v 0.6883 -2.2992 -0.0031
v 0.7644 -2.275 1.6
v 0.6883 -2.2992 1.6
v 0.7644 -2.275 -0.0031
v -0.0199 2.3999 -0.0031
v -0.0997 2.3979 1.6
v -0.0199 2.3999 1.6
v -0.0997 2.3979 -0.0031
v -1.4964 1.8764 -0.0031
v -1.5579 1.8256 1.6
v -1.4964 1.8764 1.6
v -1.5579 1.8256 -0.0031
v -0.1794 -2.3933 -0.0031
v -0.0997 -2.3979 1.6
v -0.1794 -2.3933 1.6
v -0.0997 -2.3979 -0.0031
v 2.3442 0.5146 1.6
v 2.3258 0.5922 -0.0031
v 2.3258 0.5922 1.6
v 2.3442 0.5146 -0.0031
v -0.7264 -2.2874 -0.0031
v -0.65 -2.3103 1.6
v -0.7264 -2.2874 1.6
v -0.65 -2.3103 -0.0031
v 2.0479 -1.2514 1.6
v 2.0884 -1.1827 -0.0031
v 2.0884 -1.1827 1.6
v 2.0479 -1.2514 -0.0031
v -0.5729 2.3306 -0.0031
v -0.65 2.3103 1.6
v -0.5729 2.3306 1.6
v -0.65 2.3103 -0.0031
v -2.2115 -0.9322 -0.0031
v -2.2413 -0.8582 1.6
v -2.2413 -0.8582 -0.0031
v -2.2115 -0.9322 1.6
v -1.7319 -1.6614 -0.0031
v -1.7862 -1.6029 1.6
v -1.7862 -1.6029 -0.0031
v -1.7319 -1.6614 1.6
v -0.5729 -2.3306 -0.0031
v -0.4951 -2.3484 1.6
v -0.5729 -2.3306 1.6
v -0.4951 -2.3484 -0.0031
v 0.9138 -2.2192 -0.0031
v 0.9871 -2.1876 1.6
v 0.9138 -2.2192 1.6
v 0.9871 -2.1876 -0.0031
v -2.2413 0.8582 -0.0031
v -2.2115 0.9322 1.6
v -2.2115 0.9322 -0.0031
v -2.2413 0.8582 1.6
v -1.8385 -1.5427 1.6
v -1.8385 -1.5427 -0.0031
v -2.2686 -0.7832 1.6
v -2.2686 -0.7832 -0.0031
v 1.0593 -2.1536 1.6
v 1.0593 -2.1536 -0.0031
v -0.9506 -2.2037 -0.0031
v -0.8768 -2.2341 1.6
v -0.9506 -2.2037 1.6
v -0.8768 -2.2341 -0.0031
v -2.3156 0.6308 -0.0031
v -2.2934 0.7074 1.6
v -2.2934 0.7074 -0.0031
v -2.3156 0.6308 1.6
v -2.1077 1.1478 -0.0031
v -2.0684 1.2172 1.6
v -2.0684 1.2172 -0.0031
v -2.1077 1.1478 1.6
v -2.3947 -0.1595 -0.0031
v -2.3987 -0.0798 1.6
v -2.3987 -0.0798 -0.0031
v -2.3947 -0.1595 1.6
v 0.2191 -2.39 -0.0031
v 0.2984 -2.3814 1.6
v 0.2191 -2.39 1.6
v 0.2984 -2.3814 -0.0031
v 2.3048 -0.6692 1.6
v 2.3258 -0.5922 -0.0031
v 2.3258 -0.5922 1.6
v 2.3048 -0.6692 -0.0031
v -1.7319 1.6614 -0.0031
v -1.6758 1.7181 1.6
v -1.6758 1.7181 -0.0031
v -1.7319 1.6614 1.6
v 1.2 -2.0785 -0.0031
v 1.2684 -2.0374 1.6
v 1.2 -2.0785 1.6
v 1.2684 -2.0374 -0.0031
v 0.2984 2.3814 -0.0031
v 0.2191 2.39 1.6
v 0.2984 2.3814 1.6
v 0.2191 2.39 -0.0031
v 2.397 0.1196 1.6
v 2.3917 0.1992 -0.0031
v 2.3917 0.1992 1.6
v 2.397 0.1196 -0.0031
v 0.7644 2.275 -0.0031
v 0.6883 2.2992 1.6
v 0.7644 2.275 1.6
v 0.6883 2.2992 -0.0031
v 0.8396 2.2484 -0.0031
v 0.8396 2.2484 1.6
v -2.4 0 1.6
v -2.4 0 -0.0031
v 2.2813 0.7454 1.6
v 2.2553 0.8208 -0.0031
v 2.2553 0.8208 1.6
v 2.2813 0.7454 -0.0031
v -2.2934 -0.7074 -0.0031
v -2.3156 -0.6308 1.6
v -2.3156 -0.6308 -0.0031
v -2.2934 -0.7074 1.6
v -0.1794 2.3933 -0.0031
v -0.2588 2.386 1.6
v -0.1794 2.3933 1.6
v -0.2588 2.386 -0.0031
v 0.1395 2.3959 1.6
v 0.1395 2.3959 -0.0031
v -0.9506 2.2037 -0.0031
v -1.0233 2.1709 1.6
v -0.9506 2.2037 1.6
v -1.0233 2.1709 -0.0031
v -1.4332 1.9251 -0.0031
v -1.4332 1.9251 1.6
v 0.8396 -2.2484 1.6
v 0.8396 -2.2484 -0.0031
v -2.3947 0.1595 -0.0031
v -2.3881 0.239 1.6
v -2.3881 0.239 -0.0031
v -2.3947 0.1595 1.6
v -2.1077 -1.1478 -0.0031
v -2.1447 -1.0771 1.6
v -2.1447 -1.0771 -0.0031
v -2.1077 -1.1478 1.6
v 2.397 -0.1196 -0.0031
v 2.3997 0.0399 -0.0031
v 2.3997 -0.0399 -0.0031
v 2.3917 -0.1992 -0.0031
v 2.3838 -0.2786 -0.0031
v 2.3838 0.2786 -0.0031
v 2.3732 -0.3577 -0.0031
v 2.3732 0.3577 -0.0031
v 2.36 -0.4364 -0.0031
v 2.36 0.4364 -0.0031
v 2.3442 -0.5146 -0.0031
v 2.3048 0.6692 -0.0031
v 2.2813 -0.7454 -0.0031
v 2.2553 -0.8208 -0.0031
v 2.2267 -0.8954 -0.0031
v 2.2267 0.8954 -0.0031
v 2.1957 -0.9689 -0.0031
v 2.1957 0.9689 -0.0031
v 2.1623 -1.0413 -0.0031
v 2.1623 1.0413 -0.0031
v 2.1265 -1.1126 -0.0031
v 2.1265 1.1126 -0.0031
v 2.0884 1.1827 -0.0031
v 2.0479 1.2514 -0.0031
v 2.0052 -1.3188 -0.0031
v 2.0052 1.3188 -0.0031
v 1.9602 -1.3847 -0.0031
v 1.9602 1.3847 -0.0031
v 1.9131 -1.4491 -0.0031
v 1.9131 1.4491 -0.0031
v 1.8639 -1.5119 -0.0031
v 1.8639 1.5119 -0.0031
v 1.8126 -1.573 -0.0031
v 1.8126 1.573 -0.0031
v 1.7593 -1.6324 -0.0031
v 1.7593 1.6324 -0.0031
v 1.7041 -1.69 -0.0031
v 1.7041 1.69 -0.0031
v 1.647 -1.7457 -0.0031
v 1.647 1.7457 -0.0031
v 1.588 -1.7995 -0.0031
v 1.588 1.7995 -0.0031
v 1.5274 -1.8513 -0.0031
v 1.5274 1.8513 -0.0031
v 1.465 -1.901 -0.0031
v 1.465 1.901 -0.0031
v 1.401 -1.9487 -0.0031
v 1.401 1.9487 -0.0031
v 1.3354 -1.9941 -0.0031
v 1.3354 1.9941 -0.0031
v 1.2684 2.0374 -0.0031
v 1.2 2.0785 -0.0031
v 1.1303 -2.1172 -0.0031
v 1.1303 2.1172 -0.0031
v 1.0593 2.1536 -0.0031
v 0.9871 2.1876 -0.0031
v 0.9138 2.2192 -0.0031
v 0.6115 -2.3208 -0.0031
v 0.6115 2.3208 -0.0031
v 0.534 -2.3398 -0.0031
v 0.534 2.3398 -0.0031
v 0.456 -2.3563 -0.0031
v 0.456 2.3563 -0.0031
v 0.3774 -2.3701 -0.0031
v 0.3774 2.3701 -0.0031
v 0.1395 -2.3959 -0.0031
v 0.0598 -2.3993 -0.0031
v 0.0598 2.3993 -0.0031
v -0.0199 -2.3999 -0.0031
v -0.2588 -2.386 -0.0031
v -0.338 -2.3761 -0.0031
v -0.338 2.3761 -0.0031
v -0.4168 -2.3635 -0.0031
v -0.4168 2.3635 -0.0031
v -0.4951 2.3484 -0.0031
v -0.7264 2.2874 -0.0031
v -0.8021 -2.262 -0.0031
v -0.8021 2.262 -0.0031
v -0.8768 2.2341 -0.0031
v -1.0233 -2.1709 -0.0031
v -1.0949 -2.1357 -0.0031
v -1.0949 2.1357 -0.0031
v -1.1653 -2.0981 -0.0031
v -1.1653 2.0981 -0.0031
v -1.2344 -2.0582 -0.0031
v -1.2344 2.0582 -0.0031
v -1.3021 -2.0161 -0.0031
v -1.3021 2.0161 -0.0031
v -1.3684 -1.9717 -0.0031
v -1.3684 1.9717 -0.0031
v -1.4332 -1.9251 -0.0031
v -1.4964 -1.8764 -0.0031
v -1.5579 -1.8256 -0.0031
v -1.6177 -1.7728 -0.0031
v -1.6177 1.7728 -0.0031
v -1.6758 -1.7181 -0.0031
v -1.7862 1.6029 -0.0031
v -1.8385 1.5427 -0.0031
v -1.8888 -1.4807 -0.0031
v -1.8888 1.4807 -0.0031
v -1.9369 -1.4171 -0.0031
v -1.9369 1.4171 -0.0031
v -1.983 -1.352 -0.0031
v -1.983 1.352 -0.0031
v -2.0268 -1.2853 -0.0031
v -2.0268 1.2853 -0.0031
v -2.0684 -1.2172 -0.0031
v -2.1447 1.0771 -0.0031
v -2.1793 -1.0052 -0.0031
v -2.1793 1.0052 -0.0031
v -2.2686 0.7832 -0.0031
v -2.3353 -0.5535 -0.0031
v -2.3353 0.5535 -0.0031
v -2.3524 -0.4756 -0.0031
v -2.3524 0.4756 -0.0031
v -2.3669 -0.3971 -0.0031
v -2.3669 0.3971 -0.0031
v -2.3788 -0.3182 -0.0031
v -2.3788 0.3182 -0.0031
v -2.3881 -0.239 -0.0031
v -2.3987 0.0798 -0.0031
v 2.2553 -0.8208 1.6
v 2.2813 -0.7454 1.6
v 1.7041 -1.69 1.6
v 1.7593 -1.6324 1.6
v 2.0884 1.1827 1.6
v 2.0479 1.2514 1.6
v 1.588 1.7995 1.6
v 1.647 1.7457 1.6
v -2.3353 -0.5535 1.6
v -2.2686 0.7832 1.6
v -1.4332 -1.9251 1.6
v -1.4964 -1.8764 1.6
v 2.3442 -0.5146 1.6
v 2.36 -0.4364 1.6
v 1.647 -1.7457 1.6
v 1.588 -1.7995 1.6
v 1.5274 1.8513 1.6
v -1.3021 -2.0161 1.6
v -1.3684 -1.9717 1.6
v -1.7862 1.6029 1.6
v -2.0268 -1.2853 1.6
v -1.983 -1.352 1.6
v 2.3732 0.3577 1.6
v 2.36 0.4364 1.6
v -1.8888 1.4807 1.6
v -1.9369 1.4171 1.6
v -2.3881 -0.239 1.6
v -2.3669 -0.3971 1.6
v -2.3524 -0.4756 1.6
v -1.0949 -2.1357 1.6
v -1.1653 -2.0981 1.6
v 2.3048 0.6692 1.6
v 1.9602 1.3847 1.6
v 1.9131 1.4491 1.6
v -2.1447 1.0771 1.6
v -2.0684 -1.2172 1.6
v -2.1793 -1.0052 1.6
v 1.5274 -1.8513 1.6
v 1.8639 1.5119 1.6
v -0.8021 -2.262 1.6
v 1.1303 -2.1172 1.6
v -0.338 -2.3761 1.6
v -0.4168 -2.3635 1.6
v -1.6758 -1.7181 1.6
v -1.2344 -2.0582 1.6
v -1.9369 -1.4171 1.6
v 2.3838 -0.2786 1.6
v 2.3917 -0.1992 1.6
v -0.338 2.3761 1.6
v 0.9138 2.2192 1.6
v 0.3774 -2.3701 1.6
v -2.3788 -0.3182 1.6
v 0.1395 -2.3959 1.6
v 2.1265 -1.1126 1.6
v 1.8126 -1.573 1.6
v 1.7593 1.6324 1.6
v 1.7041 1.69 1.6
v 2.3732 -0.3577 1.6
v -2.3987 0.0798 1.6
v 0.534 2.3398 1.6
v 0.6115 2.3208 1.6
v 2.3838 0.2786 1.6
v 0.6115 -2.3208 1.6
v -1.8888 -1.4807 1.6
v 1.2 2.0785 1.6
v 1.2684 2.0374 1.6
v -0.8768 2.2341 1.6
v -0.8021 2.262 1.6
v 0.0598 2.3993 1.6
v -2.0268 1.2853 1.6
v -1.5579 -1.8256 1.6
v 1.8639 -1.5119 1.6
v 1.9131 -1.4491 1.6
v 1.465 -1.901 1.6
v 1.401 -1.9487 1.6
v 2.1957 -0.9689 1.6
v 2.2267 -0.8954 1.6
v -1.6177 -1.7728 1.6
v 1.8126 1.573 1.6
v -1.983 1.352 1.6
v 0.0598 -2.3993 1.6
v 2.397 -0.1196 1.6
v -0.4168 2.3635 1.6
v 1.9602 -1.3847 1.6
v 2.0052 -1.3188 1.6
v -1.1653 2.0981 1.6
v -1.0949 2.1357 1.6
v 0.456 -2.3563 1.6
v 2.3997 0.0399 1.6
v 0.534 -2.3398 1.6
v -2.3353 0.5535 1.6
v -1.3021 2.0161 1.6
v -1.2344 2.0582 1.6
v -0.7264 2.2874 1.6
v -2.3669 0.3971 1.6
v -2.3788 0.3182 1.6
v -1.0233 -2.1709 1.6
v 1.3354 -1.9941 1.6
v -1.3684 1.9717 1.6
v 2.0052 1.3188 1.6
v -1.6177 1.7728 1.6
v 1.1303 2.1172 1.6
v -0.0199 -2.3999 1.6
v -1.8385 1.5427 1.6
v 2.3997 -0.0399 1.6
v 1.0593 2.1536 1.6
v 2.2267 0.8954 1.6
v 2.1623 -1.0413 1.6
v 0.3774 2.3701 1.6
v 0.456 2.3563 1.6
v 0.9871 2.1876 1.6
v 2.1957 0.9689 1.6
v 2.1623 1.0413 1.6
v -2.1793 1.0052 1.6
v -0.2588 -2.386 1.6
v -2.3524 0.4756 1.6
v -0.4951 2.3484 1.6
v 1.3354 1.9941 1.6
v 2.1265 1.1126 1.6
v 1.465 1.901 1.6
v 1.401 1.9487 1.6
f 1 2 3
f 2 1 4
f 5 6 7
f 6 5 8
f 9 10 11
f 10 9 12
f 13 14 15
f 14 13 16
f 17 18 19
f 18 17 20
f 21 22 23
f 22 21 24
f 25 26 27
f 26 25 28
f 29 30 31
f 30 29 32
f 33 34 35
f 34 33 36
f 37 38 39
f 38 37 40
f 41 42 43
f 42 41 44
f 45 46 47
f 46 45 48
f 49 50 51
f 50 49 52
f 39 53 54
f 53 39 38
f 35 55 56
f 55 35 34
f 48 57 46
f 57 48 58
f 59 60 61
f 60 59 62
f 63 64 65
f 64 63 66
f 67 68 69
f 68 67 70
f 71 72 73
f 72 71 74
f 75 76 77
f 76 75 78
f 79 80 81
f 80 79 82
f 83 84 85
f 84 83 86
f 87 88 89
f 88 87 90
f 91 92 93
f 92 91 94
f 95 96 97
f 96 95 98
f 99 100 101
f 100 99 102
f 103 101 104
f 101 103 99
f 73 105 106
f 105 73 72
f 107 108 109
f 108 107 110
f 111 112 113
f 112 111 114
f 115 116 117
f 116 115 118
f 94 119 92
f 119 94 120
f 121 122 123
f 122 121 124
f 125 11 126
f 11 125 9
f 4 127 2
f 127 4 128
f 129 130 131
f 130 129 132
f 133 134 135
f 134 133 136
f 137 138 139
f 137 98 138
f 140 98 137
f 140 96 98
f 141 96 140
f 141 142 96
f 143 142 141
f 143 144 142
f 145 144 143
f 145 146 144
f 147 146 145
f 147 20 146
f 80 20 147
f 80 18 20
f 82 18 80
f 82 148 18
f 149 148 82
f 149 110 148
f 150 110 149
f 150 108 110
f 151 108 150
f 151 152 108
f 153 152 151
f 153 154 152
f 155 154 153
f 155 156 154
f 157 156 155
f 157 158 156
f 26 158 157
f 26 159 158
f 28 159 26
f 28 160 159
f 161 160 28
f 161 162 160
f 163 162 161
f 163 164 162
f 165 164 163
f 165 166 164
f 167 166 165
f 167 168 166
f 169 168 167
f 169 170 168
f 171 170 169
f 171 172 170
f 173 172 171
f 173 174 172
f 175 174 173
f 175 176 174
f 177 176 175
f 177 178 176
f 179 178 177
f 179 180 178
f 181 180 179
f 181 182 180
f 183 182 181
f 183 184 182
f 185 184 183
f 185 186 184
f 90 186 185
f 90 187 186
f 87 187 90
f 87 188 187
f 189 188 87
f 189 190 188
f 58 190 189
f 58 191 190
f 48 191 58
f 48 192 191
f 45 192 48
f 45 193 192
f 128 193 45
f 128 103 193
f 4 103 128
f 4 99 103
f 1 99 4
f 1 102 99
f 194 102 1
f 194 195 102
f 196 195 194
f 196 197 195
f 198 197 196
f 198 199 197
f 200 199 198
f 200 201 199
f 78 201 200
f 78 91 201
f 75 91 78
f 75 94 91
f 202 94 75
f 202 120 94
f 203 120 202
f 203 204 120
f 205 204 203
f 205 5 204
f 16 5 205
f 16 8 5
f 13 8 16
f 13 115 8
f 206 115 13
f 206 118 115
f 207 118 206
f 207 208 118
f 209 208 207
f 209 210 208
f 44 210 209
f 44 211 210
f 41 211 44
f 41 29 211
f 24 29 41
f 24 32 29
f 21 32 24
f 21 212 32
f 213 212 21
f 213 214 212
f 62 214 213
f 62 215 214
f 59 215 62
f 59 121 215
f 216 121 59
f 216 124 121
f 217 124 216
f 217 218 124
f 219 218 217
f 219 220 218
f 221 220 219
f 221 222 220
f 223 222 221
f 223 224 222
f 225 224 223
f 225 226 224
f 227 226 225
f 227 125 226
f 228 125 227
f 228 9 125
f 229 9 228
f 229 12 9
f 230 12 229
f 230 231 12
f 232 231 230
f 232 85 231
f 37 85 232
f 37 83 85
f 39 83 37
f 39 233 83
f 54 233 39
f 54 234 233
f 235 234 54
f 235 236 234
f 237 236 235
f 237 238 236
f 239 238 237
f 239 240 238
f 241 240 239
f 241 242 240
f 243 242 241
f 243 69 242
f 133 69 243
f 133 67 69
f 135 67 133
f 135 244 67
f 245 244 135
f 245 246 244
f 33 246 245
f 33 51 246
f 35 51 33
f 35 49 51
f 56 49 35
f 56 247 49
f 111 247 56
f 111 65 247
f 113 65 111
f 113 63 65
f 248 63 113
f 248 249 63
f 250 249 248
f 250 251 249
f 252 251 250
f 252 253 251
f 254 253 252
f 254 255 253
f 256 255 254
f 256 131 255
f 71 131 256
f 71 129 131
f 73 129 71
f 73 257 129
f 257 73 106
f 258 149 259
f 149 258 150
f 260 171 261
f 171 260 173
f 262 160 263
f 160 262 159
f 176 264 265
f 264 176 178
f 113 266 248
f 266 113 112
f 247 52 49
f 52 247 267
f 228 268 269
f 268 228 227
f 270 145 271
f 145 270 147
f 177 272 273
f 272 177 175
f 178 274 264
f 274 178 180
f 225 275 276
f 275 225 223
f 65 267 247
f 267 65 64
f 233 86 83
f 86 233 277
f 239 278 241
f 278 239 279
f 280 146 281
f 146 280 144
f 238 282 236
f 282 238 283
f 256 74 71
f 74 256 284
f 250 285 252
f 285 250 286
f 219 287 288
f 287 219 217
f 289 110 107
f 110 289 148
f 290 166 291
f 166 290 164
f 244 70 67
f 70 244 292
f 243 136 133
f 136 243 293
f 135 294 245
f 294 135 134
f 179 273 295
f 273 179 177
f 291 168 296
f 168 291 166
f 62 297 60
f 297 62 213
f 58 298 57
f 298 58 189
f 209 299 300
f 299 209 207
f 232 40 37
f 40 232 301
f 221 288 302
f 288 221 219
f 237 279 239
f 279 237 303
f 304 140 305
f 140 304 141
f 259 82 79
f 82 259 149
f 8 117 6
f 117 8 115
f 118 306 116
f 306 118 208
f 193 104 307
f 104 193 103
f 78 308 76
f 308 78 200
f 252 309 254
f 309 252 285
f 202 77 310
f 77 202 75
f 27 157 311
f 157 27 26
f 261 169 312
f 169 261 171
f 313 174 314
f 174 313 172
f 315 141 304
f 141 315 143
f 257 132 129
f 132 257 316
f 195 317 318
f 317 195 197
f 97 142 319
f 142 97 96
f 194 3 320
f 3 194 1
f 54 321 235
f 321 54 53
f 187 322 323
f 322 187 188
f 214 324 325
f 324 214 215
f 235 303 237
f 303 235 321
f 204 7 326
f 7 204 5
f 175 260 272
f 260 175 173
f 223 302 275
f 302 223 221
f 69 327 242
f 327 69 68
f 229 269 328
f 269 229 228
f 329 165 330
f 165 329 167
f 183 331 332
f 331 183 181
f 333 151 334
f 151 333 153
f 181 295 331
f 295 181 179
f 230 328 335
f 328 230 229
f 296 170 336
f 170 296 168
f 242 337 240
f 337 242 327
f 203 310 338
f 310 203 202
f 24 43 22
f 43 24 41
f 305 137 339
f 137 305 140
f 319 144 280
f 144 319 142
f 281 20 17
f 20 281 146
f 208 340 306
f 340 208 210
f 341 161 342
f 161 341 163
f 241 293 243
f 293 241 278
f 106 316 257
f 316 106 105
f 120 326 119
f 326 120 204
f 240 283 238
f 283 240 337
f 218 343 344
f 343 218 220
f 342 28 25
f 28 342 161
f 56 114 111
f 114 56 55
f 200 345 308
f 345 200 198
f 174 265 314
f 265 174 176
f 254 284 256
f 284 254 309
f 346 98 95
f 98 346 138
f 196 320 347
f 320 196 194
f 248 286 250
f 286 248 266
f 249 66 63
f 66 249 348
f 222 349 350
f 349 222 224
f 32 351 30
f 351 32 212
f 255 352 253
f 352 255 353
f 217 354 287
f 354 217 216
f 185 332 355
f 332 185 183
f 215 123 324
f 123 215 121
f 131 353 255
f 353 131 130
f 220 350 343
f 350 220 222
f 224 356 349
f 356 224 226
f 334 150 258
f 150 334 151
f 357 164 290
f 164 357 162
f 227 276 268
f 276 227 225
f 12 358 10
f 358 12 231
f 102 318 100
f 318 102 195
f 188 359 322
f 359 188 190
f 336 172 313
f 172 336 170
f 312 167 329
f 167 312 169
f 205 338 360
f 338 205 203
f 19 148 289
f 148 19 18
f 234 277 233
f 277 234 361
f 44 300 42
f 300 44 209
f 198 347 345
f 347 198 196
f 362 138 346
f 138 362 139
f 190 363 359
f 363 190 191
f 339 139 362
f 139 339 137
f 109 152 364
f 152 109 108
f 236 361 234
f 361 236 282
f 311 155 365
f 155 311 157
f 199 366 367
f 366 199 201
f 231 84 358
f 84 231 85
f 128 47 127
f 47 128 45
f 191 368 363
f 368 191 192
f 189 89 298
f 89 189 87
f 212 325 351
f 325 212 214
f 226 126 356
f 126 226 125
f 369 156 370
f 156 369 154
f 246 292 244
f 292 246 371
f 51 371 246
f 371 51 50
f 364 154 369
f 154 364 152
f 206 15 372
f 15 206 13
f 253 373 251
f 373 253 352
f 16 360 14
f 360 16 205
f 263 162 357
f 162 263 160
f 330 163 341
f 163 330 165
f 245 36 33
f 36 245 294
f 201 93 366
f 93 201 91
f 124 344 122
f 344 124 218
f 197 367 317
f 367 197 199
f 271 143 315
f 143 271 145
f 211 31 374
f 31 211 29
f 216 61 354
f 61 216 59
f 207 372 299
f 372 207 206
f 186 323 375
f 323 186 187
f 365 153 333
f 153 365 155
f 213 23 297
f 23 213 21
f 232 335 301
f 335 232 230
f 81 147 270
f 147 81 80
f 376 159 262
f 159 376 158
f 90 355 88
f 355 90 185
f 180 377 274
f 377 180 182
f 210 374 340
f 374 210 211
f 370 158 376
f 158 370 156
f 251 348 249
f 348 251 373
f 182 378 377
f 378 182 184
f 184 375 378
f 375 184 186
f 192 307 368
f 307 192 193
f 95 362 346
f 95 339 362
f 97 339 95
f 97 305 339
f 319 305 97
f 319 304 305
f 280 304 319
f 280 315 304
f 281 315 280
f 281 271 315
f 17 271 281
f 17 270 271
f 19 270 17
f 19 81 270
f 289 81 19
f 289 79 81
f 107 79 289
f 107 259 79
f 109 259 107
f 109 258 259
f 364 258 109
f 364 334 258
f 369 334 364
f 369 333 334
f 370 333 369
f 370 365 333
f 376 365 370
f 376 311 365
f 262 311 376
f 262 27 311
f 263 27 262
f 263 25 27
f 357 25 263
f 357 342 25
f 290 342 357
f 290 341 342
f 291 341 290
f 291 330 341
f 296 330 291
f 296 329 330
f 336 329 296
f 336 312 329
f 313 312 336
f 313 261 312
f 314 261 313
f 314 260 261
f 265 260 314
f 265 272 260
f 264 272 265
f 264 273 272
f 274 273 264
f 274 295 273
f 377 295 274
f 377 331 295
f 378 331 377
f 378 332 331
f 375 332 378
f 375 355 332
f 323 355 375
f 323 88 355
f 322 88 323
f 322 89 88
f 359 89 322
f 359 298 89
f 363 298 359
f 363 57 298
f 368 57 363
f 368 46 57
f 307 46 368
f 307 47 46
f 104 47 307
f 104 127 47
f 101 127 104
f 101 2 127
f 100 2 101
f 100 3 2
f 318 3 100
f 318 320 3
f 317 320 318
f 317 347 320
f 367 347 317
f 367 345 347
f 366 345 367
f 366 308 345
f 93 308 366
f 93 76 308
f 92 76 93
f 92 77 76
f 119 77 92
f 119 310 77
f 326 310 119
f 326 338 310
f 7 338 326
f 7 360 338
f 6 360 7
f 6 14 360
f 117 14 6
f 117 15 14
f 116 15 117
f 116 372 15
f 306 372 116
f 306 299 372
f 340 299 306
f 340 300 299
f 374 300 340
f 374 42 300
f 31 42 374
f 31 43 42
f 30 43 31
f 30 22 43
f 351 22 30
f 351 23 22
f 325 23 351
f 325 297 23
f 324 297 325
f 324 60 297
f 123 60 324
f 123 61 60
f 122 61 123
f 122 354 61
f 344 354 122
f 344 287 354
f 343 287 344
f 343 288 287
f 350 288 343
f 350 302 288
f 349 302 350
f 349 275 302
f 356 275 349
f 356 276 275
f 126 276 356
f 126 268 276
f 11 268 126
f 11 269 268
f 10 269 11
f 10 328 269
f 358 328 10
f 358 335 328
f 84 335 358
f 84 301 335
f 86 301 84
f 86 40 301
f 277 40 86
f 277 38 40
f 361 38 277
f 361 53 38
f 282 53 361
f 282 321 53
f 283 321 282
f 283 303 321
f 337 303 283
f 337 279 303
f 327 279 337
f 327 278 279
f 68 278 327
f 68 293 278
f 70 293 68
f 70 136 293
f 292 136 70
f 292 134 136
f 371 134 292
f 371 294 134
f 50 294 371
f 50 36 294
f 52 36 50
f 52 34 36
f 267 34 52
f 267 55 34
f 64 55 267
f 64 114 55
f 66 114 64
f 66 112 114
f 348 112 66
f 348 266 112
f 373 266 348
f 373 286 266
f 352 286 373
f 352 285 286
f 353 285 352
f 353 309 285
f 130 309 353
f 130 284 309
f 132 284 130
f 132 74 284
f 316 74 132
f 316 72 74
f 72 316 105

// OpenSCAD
use <../lib.scad>
use <4088b.scad>
$fa=1; $fs=0.2;
function ldraw_lib__4088(realsolid=false) = [
// 0 ~Moved to 4088b
// 0 Name: 4088.dat
// 0 Author: [PTadmin]
// 0 !LDRAW_ORG Part UPDATE 2018-01
// 0 !LICENSE Licensed under CC BY 4.0 : see CAreadme.txt
// 
// 0 BFC CERTIFY CCW
  [0,"BFC","CERTIFY"],
  [0,"BFC","CCW"],
// 
// 0 !HISTORY 2018-01-30 [PTadmin] Official Update 2018-01
// 
// 
// 0 // Brick 1 x 4 x 2 with Centre Stud Top
// 1 16 0 0 0 1 0 0 0 1 0 0 0 1 4088b.dat
  [1,16,0,0,0,1,0,0,0,1,0,0,0,1, ldraw_lib__4088b(realsolid)],
];
module ldraw_lib__4088(step=0, col=false, unit=2/5, alt=false, line=0.2, solid=!$preview)
    makepoly(ldraw_lib__4088(solid), step=step, col=col, unit=unit, alt=alt, line=line, solid=solid);
ldraw_lib__4088(line=0.2);
